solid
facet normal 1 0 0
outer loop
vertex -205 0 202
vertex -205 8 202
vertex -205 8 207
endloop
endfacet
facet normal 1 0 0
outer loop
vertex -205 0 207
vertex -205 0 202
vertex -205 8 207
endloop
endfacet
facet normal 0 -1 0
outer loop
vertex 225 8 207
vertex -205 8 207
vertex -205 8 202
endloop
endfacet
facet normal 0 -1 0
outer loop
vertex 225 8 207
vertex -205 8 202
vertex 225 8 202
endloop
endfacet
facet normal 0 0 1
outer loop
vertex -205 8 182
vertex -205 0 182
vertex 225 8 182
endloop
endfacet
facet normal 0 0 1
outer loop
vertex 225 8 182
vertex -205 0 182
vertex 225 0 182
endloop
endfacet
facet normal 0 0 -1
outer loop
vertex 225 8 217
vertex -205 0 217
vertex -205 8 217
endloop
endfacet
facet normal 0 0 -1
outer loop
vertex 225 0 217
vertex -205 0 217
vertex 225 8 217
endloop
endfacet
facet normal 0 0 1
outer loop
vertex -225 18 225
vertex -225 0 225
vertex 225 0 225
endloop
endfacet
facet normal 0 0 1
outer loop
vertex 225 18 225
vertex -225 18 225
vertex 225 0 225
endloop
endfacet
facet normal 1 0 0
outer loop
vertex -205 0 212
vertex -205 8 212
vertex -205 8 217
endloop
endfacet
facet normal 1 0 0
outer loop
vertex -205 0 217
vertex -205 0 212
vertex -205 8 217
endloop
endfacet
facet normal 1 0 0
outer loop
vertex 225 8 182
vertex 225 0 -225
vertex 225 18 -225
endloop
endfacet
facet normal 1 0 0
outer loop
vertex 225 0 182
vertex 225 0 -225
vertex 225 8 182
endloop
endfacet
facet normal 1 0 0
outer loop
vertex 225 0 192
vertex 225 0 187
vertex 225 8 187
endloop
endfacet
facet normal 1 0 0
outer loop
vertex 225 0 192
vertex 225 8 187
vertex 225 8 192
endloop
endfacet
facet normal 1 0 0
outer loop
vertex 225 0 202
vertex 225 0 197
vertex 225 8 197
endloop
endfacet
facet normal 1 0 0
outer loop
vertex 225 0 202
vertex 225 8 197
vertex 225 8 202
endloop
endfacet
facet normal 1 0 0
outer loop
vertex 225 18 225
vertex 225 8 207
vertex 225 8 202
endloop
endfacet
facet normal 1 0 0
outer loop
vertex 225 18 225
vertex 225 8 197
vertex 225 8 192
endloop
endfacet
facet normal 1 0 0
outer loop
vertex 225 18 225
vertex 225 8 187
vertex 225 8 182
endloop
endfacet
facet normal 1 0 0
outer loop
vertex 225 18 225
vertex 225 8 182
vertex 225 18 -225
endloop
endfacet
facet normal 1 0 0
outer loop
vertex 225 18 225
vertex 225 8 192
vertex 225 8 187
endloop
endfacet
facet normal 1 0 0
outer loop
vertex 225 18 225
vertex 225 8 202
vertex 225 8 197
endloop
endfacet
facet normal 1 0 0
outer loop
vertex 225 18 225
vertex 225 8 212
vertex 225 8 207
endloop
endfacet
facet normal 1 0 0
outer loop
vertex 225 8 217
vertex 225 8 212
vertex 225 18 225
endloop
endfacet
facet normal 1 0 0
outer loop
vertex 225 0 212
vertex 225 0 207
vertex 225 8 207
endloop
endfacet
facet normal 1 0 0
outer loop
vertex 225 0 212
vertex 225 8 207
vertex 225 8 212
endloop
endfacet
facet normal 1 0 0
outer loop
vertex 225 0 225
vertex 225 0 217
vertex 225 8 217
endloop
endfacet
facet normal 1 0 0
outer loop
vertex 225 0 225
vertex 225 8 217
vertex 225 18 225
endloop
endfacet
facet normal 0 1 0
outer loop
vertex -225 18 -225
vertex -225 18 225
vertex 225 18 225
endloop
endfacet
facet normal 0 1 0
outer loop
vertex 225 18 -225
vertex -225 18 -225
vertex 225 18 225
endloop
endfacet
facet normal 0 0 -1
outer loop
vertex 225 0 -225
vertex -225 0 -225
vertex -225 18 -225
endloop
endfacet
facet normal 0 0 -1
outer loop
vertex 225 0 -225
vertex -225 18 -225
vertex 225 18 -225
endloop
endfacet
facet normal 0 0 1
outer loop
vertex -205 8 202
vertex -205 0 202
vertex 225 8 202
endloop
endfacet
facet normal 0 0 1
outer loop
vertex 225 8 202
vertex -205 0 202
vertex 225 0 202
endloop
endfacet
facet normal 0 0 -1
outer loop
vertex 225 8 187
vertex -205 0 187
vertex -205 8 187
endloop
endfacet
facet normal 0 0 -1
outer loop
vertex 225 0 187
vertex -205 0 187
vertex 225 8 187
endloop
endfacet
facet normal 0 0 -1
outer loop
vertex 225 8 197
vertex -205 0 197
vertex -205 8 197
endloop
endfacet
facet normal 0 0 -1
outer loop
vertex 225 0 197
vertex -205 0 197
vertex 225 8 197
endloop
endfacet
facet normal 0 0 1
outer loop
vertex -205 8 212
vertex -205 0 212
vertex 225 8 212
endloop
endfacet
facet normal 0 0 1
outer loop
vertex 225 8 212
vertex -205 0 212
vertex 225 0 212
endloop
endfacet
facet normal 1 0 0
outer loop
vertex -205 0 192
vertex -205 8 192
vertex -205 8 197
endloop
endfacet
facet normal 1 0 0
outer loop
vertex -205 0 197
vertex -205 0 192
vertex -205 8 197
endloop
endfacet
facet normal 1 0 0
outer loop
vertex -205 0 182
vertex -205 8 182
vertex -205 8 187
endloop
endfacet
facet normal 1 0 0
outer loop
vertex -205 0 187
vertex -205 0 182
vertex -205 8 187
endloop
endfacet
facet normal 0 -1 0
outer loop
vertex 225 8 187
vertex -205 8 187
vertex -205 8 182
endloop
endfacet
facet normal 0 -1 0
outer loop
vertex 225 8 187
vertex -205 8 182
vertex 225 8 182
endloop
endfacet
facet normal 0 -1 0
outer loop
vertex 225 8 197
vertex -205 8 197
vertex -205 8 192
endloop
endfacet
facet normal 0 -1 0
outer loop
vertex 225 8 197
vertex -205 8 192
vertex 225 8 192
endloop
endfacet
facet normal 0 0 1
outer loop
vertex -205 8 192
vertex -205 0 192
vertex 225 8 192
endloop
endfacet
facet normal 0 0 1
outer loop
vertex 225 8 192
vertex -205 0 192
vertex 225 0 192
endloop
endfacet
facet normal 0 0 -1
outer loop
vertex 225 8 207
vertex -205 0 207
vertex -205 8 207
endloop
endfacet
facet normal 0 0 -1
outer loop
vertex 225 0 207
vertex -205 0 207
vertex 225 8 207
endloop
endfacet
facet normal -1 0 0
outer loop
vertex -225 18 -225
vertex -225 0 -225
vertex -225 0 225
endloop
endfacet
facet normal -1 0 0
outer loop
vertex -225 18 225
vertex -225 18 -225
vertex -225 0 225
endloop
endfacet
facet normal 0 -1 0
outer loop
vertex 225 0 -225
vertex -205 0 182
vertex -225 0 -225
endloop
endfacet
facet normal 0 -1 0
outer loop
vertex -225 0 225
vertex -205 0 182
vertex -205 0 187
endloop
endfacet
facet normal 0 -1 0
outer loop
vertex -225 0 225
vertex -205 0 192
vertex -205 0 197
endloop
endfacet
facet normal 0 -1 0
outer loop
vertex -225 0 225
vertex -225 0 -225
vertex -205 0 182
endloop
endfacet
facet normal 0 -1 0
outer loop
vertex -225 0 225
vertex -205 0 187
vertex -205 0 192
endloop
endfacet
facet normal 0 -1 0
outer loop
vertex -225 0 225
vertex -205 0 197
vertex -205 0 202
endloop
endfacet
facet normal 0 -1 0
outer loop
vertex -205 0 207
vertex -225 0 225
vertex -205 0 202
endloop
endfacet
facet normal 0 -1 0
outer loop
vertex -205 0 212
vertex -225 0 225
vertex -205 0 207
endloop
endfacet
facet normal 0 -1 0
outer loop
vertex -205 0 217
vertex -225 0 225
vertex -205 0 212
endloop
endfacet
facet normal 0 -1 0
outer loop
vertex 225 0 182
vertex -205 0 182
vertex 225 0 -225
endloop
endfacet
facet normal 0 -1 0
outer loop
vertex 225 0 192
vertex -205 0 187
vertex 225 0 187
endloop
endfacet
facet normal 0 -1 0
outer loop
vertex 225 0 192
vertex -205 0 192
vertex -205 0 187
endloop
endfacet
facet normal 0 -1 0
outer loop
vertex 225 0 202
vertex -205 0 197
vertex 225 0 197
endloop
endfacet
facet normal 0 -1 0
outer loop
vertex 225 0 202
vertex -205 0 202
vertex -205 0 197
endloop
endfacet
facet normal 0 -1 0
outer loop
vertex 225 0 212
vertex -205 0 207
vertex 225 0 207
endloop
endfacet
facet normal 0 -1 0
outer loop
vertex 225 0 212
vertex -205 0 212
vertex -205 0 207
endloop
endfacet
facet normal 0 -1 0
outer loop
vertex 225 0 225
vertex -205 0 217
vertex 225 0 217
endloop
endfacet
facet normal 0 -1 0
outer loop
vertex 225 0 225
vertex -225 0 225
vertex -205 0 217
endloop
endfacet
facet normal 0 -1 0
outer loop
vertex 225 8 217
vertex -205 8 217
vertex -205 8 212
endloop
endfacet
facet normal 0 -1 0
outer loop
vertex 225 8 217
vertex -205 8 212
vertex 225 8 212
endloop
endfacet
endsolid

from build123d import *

# Parameters (mm, degrees)
F0_W     = 450
F0_H     = 450
F1_DEPTH = 18
F2_W     = 430
F2_H     = 5
F3_DEPTH = 8


with BuildPart() as f1:
    # F0 (on Front) → F1 (new body)
    with BuildSketch(Plane.XZ):
        Rectangle(F0_W, F0_H)
    extrude(amount=-F1_DEPTH)

    # F2 (on face) → F3 (cut)
    with BuildSketch(Plane.XZ):
        with Locations((10, 214.5)):
            Rectangle(F2_W, F2_H)
        with Locations((10, 204.5)):
            Rectangle(F2_W, F2_H)
        with Locations((10, 194.5)):
            Rectangle(F2_W, F2_H)
        with Locations((10, 184.5)):
            Rectangle(F2_W, F2_H)
    extrude(amount=-F3_DEPTH, mode=Mode.SUBTRACT)


solid = f1.part
